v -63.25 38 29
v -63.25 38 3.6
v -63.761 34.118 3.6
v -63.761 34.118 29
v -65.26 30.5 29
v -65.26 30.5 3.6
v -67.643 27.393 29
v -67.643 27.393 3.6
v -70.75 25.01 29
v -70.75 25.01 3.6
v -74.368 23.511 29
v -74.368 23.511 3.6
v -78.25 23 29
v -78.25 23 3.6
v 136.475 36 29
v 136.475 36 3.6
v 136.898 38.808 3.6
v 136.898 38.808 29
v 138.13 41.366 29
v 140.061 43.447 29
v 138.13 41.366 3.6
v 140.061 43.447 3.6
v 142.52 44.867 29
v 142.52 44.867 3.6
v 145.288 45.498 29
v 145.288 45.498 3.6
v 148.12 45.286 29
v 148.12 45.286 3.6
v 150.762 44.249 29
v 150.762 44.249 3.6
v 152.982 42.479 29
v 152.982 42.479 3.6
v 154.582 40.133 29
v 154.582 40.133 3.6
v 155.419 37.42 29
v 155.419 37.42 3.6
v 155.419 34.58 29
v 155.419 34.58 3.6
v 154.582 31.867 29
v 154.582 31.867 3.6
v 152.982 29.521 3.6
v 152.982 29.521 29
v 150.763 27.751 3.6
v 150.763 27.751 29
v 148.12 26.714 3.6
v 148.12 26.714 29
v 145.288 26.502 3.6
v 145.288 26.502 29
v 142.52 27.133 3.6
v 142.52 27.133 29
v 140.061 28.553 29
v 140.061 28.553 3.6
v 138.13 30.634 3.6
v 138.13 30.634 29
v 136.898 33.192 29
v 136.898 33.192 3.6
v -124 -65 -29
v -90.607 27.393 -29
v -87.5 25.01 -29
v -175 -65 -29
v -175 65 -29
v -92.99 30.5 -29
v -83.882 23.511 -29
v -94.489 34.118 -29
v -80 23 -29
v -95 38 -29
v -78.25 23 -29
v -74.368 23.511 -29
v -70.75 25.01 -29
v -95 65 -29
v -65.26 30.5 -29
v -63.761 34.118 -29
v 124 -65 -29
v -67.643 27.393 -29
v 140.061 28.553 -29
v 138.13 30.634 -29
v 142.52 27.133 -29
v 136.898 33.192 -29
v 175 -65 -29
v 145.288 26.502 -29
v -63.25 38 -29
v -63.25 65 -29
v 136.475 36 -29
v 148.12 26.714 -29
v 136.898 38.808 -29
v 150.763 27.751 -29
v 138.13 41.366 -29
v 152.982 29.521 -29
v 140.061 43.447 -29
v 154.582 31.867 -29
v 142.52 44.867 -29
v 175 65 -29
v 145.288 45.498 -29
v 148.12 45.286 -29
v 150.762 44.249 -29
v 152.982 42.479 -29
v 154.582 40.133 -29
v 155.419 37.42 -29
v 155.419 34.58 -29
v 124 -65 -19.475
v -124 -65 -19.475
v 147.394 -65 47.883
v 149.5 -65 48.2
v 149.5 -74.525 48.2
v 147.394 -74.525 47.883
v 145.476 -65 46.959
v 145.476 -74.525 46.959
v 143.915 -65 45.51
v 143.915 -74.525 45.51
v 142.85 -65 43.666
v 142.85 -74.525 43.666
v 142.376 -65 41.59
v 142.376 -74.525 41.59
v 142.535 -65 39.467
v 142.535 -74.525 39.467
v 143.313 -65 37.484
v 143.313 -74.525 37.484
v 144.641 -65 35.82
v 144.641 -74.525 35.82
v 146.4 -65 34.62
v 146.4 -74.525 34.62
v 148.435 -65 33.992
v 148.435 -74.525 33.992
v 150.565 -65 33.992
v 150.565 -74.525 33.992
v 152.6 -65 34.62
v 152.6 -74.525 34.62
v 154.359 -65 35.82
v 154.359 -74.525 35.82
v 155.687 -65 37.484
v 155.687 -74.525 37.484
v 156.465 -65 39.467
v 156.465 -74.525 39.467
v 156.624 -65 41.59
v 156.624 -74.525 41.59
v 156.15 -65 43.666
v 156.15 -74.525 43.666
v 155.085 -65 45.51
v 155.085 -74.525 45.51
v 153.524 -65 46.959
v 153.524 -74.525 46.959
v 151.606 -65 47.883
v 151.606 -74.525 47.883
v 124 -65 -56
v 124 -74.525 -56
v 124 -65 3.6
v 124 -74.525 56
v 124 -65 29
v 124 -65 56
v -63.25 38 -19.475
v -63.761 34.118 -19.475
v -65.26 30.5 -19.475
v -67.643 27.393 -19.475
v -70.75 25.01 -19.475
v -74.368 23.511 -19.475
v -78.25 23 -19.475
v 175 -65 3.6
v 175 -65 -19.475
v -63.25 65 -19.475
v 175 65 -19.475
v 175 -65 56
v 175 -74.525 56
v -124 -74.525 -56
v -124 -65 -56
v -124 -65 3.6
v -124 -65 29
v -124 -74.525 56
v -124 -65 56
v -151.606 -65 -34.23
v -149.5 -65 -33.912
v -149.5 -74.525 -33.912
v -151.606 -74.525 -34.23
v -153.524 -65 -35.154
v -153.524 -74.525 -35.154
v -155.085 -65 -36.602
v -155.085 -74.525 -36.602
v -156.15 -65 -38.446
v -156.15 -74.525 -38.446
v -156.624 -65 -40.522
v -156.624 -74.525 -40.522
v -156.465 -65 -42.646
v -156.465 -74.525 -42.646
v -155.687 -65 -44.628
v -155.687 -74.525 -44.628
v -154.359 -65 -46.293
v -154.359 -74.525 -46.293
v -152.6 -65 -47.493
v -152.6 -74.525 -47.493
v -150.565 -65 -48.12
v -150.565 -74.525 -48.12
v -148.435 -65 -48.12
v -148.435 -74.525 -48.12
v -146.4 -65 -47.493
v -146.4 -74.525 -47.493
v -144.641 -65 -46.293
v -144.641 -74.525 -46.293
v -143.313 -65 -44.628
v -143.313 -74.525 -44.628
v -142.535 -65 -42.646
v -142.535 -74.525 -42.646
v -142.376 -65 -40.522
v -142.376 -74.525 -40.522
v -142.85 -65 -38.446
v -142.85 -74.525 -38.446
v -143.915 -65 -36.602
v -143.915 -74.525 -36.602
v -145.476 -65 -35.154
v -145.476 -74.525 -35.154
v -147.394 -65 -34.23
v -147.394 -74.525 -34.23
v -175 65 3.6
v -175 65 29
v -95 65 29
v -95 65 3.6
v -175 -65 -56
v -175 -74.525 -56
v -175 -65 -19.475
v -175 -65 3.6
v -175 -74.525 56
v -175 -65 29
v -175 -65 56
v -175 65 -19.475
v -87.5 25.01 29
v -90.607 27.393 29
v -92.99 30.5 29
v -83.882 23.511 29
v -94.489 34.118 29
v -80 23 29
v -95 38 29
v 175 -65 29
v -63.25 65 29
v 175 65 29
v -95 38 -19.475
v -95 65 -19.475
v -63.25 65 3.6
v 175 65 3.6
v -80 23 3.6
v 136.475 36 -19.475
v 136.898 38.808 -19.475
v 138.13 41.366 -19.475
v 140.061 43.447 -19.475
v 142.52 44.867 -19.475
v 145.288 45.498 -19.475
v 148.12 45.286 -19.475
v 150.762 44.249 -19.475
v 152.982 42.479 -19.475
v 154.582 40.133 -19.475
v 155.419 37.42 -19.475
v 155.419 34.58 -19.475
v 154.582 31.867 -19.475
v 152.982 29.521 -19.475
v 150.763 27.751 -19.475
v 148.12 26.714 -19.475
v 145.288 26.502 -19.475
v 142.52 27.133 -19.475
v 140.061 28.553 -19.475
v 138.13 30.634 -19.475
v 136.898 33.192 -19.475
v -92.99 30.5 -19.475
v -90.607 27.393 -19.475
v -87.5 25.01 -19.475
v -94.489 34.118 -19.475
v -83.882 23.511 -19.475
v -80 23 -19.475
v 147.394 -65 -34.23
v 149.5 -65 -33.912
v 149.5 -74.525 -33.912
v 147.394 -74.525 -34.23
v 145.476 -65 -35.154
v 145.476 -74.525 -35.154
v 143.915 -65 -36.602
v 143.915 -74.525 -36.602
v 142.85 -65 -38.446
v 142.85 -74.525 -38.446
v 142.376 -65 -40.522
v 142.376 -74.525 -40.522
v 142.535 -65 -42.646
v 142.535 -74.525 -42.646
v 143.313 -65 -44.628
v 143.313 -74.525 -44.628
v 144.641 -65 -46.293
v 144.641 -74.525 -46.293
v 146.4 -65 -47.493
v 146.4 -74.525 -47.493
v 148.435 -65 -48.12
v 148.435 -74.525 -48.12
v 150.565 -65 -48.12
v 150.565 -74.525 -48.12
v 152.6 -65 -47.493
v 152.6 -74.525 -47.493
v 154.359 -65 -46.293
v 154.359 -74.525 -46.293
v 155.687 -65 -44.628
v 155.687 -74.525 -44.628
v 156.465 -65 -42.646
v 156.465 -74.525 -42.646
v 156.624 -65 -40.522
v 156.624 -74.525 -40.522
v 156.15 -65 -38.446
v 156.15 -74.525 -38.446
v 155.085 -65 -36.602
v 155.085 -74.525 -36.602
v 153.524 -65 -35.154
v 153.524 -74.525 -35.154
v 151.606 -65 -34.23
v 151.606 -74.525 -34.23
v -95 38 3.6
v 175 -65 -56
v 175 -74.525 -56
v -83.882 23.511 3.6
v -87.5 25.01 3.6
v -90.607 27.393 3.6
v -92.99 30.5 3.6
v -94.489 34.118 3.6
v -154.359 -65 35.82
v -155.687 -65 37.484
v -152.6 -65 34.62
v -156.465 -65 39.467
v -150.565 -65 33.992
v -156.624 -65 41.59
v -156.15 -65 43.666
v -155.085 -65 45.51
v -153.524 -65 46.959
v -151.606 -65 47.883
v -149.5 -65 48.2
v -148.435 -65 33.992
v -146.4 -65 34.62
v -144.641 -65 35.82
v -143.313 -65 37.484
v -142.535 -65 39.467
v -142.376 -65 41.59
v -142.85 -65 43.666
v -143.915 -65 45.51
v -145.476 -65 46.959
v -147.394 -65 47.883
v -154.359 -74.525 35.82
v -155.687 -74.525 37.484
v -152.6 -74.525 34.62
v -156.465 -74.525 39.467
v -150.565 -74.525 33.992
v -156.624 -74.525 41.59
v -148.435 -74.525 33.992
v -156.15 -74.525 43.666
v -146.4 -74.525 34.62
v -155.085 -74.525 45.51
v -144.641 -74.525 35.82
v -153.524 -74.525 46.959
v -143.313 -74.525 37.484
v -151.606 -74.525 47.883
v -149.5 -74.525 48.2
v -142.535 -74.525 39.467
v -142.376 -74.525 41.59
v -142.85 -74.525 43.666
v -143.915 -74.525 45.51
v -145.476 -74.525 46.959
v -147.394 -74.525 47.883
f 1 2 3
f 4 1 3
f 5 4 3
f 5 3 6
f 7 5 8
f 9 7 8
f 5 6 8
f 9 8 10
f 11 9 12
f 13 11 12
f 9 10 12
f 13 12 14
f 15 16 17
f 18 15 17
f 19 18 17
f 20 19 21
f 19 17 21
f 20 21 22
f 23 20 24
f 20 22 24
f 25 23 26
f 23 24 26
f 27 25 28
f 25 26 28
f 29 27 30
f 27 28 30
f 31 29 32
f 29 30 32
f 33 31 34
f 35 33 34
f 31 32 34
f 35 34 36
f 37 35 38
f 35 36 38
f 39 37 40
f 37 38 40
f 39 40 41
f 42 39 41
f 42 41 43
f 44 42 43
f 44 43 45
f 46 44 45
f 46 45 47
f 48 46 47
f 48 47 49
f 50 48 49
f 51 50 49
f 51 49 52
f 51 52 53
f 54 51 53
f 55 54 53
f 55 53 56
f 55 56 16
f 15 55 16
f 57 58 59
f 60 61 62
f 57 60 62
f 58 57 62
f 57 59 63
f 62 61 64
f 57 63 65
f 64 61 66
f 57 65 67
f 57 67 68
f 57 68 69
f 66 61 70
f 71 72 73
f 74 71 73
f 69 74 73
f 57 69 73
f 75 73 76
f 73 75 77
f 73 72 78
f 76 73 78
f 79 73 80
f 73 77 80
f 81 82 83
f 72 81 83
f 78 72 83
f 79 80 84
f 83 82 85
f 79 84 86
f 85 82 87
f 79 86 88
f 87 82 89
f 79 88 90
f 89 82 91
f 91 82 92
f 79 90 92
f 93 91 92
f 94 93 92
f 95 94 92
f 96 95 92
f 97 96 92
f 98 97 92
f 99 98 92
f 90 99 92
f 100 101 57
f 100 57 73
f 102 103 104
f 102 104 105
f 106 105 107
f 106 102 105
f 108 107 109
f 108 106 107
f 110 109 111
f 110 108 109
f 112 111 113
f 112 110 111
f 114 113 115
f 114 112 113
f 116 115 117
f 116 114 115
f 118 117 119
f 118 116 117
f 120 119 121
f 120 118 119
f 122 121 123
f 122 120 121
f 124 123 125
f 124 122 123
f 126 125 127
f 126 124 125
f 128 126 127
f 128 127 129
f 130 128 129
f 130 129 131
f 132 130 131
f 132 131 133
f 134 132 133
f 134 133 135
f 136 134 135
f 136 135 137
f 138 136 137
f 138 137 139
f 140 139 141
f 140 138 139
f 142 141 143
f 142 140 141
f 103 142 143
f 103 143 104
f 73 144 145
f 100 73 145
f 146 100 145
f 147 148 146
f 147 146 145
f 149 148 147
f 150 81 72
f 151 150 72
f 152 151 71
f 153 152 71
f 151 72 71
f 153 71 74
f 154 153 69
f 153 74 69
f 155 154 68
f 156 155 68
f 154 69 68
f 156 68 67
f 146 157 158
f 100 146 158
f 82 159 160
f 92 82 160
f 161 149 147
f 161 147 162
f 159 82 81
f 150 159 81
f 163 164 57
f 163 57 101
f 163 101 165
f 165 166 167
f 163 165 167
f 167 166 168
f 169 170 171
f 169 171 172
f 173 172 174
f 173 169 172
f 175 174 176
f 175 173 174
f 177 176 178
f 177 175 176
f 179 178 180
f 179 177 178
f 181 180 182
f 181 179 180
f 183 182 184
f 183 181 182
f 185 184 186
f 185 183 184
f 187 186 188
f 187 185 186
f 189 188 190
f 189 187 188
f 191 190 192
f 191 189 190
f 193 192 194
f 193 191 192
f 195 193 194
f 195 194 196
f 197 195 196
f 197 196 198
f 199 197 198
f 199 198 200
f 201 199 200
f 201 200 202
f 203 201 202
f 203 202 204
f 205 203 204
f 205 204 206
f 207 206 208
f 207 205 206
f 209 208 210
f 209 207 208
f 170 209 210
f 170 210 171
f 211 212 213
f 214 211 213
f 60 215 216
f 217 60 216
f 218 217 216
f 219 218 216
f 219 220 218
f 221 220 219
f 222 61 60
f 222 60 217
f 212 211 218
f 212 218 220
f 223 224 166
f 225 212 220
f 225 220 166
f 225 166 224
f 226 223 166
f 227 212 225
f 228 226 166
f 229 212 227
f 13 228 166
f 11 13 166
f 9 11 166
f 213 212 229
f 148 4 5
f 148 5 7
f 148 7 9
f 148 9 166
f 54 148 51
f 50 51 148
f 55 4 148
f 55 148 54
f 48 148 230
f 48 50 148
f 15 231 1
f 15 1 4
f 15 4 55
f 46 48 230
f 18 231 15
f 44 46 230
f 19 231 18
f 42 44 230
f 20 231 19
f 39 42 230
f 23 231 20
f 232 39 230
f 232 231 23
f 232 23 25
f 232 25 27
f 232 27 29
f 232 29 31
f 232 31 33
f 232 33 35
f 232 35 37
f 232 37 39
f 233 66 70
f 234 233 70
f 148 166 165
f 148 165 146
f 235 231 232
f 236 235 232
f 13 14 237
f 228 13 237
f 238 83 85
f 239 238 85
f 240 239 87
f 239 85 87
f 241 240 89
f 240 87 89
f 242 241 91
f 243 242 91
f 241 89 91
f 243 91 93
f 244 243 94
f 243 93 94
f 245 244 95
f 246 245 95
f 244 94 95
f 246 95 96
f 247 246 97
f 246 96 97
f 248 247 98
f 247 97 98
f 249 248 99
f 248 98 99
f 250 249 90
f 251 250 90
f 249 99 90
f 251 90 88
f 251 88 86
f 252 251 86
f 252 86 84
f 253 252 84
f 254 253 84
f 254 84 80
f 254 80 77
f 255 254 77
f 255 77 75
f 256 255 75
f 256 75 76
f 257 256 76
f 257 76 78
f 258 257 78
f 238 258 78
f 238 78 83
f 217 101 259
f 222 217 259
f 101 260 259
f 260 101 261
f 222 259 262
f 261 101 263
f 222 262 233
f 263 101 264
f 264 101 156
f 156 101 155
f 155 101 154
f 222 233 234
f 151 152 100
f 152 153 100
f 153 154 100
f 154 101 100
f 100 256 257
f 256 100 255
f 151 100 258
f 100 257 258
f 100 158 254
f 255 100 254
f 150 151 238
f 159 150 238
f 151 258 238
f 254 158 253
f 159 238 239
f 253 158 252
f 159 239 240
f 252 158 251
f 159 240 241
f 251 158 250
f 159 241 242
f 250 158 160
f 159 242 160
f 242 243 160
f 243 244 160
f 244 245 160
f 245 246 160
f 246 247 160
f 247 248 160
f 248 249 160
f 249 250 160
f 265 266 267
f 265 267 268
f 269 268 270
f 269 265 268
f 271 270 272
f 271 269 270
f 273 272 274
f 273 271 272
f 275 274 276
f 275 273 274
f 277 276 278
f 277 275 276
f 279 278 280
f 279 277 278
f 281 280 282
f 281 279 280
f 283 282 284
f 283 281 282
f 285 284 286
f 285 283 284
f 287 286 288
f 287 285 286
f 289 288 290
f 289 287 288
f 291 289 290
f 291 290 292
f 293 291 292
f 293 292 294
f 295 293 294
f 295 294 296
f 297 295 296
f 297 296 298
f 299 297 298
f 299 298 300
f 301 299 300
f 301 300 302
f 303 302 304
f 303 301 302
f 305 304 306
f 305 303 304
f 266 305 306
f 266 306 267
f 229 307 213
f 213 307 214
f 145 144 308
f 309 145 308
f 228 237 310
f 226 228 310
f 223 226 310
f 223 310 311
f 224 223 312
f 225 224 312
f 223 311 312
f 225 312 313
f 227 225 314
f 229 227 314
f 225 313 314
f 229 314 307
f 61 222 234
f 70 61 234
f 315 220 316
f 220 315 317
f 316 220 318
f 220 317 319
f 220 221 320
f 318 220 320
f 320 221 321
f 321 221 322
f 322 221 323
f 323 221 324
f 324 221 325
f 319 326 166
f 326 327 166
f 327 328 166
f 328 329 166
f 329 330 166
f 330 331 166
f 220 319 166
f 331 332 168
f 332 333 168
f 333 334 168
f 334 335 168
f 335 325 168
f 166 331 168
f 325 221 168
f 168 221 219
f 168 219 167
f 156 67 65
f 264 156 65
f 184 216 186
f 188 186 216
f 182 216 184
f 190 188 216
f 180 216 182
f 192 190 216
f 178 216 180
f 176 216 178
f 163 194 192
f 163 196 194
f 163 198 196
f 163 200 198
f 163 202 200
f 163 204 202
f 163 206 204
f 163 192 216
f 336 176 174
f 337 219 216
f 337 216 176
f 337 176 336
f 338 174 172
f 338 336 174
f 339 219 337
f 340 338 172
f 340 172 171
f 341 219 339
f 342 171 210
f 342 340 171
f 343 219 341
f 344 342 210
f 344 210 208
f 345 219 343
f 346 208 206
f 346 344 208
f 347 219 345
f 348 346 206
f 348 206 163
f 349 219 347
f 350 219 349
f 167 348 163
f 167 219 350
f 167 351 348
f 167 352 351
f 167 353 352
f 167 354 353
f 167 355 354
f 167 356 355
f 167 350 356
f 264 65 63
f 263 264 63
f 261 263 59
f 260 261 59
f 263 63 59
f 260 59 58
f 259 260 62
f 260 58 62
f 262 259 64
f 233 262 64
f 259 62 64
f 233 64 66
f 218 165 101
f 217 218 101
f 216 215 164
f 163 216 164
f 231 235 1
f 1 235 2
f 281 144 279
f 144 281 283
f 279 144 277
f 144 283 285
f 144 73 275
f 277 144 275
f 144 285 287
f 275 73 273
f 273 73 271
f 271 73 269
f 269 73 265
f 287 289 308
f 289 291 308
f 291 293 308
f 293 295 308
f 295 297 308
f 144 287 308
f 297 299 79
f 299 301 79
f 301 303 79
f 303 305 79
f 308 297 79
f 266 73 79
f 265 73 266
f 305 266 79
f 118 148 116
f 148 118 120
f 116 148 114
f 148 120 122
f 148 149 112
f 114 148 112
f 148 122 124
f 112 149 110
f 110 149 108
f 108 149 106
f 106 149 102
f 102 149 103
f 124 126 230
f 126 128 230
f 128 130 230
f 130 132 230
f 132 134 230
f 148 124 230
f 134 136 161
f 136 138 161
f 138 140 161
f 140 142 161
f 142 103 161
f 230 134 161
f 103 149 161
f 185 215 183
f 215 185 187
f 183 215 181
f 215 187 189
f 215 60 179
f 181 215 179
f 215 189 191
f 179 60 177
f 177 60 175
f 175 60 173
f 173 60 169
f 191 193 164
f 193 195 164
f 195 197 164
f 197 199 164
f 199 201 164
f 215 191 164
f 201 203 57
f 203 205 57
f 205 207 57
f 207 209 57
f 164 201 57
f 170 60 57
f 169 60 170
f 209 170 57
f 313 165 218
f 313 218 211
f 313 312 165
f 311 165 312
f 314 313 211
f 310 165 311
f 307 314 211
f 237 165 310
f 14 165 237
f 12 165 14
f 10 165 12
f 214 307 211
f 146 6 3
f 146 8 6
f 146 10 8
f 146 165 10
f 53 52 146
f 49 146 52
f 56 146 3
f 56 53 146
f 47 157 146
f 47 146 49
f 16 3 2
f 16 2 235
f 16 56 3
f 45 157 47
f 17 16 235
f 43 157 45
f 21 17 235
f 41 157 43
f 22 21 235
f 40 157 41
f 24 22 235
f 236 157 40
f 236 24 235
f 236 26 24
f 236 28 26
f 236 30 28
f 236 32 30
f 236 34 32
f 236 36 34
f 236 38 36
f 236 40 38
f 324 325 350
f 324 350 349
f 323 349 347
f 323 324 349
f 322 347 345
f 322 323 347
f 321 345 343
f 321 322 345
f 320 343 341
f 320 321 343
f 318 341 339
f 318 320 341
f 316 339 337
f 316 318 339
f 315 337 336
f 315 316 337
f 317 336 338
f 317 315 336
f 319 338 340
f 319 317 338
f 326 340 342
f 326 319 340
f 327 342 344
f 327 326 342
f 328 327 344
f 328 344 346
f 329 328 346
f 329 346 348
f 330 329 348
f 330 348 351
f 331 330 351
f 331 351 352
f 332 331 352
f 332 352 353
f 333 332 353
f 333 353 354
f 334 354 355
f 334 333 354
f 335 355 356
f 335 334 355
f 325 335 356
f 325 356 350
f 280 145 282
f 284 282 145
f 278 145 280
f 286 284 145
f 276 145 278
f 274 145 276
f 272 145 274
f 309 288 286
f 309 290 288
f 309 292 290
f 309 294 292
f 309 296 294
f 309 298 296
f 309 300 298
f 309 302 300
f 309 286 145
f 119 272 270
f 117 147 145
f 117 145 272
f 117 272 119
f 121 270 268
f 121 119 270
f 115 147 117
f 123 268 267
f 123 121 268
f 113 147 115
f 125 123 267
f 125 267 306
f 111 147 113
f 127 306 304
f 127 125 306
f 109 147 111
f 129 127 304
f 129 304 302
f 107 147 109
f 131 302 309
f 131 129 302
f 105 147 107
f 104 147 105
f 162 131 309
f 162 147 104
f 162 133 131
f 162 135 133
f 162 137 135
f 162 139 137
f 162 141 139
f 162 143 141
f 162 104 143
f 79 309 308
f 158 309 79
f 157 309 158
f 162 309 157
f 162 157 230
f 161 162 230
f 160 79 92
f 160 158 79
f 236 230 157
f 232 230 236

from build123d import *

# Parameters (mm, degrees)
CROQUIS1_W              = 350
CROQUIS1_H              = 130
SALIENTE_EXTRUIR1_DEPTH = 29
CROQUIS2_W              = 51
CROQUIS2_H              = 112
CROQUIS2_R              = 7.14375
SALIENTE_EXTRUIR2_DEPTH = 9.525
CORTAR_EXTRUIR1_DEPTH   = 99.525
CROQUIS4_W              = 23.075
CROQUIS4_H              = 130
CORTAR_EXTRUIR2_DEPTH   = 363.201567673
CROQUIS5_R              = 9.525
CORTAR_EXTRUIR3_DEPTH   = 99.525


with BuildPart() as part:
    # Croquis1 → Saliente-Extruir1 (new, symmetric)
    with BuildSketch(Plane.XY):
        Rectangle(CROQUIS1_W, CROQUIS1_H)
    extrude(amount=SALIENTE_EXTRUIR1_DEPTH, both=True)

    # Croquis2 → Saliente-Extruir2 (add)
    # profile 1 of 2: a face of its own
    with BuildSketch(Plane.XZ.offset(65)):
        with Locations((-149.5, 0)):
            Rectangle(CROQUIS2_W, CROQUIS2_H)
        with Locations(Location((-149.5, 41.05625, 0), (0, 0, 90))):
            Circle(CROQUIS2_R, mode=Mode.SUBTRACT)
        with Locations(Location((-149.5, -41.05625, 0), (0, 0, 90))):
            Circle(CROQUIS2_R, mode=Mode.SUBTRACT)
    # profile 2 of 2: a face of its own
    with BuildSketch(Plane.XZ.offset(65)):
        with Locations((149.5, 0)):
            Rectangle(CROQUIS2_W, CROQUIS2_H)
        with Locations(Location((149.5, -41.05625, 0), (0, 0, 90))):
            Circle(CROQUIS2_R, mode=Mode.SUBTRACT)
        with Locations(Location((149.5, 41.05625, 0), (0, 0, 90))):
            Circle(CROQUIS2_R, mode=Mode.SUBTRACT)
    extrude(amount=SALIENTE_EXTRUIR2_DEPTH)

    # Croquis3 → Cortar-Extruir1 (cut)
    with BuildSketch(Plane(origin=(0, 0, -29), x_dir=(-1, 0, 0), z_dir=(0, 0, -1))):
        with BuildLine():
            Line((95, 65), (63.25, 65))
            Line((63.25, 65), (63.25, 38))
            ThreePointArc((63.25, 38), (67.643398282, 27.393398282), (78.25, 23))
            Line((78.25, 23), (80, 23))
            ThreePointArc((80, 23), (90.606601718, 27.393398282), (95, 38))
            Line((95, 38), (95, 65))
        make_face()
    extrude(amount=-CORTAR_EXTRUIR1_DEPTH, mode=Mode.SUBTRACT)

    # Croquis4 → Cortar-Extruir2 (cut, through all)
    with BuildSketch(Plane(origin=(175, 0, 0), x_dir=(0, 0, -1), z_dir=(1, 0, 0))):
        with Locations((7.9375, 0)):
            Rectangle(CROQUIS4_W, CROQUIS4_H)
    extrude(amount=-CORTAR_EXTRUIR2_DEPTH, mode=Mode.SUBTRACT)

    # Croquis5 → Cortar-Extruir3 (cut)
    with BuildSketch(Plane(origin=(0, 0, -29), x_dir=(-1, 0, 0), z_dir=(0, 0, -1))):
        with Locations((-146, 36)):
            Circle(CROQUIS5_R)
    extrude(amount=-CORTAR_EXTRUIR3_DEPTH, mode=Mode.SUBTRACT)


solid = part.part
